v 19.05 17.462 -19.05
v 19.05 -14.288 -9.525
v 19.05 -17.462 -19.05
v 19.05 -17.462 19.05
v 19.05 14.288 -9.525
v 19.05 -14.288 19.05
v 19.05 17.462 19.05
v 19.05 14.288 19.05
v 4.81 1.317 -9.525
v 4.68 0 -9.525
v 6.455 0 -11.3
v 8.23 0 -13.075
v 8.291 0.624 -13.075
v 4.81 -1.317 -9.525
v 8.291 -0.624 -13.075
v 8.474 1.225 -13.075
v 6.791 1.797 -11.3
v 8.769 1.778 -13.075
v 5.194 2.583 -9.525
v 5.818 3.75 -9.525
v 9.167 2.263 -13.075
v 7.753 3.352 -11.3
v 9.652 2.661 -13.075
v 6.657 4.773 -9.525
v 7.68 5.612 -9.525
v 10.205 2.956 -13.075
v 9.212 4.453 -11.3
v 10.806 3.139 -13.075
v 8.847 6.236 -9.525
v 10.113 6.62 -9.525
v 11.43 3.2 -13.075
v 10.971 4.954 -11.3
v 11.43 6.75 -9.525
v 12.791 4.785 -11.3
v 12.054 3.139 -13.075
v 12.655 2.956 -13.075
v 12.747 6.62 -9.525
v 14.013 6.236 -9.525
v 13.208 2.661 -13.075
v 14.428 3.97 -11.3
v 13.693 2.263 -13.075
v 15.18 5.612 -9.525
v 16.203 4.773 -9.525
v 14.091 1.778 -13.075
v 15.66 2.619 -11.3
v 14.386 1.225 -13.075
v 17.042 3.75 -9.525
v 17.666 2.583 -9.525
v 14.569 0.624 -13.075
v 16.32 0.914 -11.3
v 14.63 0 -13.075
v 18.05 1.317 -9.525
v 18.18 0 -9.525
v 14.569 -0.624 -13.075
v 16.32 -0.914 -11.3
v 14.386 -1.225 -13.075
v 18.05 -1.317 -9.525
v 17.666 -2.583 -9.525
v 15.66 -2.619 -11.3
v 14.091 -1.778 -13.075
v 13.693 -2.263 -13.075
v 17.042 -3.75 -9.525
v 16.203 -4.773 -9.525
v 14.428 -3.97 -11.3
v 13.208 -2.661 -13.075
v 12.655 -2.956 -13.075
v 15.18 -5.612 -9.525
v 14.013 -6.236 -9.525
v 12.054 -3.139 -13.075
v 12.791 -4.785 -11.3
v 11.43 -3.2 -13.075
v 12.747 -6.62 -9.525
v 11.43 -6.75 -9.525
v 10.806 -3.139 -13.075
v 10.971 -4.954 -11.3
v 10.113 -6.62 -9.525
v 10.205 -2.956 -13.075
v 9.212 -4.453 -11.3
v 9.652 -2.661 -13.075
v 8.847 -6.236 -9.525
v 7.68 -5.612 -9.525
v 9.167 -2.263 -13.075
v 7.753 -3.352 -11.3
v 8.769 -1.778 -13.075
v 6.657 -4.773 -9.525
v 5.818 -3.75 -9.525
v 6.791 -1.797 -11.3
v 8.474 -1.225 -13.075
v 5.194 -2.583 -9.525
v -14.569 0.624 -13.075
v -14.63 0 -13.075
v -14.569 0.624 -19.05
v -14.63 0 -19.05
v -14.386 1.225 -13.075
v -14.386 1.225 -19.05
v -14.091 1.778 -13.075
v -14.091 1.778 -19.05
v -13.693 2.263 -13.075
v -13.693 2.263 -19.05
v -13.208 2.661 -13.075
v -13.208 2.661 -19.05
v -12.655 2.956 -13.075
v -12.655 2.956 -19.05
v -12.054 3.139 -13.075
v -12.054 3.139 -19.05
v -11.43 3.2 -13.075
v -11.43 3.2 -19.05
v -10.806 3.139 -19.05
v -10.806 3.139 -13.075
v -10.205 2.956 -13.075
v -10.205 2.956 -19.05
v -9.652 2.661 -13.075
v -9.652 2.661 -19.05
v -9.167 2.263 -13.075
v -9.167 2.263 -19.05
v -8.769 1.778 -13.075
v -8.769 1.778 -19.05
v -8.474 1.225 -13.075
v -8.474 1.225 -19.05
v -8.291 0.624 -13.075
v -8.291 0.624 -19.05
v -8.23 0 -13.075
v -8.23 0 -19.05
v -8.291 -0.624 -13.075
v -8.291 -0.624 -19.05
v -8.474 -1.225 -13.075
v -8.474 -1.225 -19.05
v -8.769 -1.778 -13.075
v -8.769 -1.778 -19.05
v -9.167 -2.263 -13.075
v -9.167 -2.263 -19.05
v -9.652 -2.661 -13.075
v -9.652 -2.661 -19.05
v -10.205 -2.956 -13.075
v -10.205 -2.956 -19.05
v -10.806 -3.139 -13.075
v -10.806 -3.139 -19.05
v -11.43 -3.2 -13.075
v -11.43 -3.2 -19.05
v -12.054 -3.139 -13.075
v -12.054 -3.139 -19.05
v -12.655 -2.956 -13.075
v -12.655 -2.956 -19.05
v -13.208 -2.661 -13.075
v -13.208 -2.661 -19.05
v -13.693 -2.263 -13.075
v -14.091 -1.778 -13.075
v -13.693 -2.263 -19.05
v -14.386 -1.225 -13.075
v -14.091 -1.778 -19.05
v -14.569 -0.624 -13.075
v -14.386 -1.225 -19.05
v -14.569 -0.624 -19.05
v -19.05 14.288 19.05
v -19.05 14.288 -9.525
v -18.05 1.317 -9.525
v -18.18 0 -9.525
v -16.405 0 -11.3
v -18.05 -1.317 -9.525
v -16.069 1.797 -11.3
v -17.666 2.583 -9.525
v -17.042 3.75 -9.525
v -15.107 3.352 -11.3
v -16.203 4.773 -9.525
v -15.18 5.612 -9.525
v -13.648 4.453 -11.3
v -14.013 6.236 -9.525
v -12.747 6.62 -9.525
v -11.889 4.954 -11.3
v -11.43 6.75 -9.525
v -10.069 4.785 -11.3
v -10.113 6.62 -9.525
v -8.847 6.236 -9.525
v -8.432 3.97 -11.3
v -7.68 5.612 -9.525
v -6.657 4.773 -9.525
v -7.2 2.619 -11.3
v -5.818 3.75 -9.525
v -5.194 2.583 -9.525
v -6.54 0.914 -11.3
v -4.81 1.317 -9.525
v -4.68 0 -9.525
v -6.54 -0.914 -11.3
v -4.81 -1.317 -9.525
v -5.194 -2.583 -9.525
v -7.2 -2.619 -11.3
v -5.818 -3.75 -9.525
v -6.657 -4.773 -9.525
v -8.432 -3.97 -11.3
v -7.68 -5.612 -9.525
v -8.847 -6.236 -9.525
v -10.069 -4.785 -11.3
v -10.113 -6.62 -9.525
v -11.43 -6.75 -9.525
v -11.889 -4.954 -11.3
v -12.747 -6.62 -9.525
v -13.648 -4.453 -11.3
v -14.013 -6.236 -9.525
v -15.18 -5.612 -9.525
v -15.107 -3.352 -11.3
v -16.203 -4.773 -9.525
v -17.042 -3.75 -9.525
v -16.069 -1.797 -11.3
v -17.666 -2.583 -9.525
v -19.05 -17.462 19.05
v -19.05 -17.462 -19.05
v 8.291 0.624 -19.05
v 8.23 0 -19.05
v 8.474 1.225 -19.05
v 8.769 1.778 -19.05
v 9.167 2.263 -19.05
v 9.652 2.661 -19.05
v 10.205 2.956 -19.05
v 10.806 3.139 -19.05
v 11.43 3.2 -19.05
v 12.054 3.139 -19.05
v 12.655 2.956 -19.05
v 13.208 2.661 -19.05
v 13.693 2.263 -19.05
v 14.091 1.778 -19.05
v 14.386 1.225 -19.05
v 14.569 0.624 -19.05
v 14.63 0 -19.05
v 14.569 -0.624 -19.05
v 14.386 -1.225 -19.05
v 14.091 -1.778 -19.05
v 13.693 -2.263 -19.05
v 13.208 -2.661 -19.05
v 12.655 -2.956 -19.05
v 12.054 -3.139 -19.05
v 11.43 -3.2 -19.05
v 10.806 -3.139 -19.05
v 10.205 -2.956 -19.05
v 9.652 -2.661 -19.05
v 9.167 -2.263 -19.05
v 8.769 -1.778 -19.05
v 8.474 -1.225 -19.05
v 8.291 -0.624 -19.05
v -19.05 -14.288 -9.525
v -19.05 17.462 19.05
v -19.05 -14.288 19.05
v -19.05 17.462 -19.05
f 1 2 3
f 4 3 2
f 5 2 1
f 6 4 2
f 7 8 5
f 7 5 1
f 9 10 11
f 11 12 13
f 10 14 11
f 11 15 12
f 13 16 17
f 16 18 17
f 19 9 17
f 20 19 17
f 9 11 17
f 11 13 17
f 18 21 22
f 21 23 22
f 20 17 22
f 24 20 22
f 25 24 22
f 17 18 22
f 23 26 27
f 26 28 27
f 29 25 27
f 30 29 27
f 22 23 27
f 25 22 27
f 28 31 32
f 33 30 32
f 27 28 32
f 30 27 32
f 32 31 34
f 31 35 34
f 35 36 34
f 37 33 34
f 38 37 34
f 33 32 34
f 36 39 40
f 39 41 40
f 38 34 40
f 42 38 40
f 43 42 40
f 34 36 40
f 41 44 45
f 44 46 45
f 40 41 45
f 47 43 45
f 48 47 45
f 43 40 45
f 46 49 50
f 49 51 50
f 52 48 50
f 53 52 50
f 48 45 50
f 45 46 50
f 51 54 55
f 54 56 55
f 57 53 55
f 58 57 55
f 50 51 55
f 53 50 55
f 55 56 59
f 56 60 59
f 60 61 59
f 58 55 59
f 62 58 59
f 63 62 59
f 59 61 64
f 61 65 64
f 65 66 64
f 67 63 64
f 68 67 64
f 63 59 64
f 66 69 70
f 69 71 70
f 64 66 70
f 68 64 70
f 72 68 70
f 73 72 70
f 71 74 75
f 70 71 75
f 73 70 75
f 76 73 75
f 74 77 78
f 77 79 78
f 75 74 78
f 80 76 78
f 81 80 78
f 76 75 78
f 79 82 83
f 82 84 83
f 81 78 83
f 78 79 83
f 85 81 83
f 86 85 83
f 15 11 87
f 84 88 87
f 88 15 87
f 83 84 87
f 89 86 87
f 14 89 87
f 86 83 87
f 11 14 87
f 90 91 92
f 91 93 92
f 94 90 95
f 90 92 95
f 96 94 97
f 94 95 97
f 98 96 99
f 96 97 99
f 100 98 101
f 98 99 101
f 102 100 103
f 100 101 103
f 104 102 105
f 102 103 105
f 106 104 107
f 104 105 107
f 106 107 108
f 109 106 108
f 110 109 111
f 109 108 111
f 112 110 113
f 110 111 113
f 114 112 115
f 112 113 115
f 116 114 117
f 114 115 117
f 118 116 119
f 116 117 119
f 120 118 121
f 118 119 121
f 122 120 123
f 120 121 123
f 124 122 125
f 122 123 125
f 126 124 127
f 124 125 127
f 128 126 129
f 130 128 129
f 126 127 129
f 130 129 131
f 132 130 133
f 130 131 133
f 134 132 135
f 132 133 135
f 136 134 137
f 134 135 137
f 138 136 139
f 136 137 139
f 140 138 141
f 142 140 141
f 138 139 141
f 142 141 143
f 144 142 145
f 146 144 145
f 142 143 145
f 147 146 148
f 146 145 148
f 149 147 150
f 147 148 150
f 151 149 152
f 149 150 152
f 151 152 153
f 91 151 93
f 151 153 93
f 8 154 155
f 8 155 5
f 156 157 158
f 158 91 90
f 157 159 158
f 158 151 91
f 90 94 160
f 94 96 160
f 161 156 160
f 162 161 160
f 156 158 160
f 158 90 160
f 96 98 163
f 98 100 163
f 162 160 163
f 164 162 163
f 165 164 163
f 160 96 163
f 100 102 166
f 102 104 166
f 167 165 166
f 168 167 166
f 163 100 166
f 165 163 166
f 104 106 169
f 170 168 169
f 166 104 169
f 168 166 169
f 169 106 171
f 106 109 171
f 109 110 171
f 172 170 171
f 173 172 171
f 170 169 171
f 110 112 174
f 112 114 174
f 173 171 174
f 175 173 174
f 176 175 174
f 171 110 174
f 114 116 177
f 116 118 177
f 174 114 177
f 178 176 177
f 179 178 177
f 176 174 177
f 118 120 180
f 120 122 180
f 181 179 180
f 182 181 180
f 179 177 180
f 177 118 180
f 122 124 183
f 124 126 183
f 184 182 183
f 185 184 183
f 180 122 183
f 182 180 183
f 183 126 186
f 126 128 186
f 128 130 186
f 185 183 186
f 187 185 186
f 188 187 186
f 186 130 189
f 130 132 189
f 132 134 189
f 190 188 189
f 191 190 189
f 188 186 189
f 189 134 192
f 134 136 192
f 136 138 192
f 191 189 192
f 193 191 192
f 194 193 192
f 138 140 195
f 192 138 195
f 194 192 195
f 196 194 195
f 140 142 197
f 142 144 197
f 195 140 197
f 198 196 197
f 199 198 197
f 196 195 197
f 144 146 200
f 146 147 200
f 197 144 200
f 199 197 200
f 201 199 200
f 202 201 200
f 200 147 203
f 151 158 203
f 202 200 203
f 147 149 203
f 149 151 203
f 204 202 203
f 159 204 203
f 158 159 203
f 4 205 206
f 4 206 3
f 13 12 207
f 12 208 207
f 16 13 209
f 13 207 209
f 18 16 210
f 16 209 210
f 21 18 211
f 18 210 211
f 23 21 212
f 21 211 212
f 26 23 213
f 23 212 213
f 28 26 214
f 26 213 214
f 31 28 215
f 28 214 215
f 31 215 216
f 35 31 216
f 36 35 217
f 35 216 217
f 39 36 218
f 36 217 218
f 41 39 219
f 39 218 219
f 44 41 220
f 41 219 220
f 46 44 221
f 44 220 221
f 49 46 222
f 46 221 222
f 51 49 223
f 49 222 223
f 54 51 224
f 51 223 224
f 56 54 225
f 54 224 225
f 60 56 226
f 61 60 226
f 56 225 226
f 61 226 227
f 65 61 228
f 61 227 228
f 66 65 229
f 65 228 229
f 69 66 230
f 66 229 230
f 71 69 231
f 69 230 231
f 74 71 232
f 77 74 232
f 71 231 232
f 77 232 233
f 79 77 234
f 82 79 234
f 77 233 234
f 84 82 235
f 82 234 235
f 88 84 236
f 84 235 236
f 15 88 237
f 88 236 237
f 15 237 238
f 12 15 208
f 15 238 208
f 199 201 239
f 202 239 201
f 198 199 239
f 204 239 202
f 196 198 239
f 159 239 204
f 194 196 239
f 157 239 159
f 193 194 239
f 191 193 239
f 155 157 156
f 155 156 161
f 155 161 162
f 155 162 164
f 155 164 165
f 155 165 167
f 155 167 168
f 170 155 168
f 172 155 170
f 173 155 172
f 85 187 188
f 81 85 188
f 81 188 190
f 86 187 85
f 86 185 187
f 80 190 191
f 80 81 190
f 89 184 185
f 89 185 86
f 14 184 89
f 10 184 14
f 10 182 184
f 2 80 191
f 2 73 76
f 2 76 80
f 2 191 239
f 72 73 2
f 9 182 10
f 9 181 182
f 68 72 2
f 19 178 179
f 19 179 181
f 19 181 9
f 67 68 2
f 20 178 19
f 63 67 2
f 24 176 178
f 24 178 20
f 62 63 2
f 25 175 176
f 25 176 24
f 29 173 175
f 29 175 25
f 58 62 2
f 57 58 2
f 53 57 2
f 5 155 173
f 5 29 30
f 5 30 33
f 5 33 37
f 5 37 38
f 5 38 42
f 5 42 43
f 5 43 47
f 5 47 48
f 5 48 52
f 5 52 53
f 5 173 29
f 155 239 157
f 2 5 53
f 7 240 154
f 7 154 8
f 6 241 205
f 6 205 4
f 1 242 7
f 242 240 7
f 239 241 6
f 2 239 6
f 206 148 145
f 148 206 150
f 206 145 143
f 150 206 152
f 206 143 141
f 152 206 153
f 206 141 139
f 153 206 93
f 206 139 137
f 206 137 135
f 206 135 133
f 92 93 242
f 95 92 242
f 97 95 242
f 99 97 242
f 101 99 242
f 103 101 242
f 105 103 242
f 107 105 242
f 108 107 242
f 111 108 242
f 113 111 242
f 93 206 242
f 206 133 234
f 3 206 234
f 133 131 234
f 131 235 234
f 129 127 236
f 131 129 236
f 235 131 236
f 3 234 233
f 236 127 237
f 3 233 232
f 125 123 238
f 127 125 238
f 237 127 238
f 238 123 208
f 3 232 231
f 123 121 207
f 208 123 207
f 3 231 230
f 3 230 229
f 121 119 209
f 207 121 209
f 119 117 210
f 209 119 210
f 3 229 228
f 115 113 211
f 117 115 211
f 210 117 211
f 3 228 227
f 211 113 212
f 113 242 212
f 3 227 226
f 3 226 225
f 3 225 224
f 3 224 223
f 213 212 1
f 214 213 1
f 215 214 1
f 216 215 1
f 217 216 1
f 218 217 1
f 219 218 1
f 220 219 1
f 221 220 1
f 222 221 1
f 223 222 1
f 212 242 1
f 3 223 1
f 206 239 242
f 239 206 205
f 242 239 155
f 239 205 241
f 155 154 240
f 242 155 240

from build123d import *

# Parameters (mm, degrees)
SKETCH1_W                                            = 38.1
SKETCH1_H                                            = 34.925
BOSS_EXTRUDE1_DEPTH                                  = 19.05
SKETCH3_W                                            = 38.1
SKETCH3_H                                            = 28.575
CUT_EXTRUDE1_DEPTH                                   = 28.575
CSK_FOR_M6_HEX_SOCKET_COUNTERSUNK_HEAD_S_D           = 6.4
CSK_FOR_M6_HEX_SOCKET_COUNTERSUNK_HEAD_S_CSINK_D     = 13.5
CSK_FOR_M6_HEX_SOCKET_COUNTERSUNK_HEAD_S_CSINK_ANGLE = 90


with BuildPart() as part:
    # Sketch1 → Boss-Extrude1 (new body, symmetric)
    with BuildSketch(Plane.XY):
        Rectangle(SKETCH1_W, SKETCH1_H)
    extrude(amount=BOSS_EXTRUDE1_DEPTH, both=True)

    # Sketch3 → Cut-Extrude1 (cut)
    with BuildSketch(Plane.XY.offset(19.05)):
        Rectangle(SKETCH3_W, SKETCH3_H)
    extrude(amount=-CUT_EXTRUDE1_DEPTH, mode=Mode.SUBTRACT)

    # CSK for M6 Hex Socket Countersunk Head Screw1 (through all)
    with Locations(Plane.XY.offset(-9.525)):
        with Locations((-11.43, 0), (11.43, 0)):
            CounterSinkHole(CSK_FOR_M6_HEX_SOCKET_COUNTERSUNK_HEAD_S_D / 2, CSK_FOR_M6_HEX_SOCKET_COUNTERSUNK_HEAD_S_CSINK_D / 2, counter_sink_angle=CSK_FOR_M6_HEX_SOCKET_COUNTERSUNK_HEAD_S_CSINK_ANGLE)


solid = part.part
